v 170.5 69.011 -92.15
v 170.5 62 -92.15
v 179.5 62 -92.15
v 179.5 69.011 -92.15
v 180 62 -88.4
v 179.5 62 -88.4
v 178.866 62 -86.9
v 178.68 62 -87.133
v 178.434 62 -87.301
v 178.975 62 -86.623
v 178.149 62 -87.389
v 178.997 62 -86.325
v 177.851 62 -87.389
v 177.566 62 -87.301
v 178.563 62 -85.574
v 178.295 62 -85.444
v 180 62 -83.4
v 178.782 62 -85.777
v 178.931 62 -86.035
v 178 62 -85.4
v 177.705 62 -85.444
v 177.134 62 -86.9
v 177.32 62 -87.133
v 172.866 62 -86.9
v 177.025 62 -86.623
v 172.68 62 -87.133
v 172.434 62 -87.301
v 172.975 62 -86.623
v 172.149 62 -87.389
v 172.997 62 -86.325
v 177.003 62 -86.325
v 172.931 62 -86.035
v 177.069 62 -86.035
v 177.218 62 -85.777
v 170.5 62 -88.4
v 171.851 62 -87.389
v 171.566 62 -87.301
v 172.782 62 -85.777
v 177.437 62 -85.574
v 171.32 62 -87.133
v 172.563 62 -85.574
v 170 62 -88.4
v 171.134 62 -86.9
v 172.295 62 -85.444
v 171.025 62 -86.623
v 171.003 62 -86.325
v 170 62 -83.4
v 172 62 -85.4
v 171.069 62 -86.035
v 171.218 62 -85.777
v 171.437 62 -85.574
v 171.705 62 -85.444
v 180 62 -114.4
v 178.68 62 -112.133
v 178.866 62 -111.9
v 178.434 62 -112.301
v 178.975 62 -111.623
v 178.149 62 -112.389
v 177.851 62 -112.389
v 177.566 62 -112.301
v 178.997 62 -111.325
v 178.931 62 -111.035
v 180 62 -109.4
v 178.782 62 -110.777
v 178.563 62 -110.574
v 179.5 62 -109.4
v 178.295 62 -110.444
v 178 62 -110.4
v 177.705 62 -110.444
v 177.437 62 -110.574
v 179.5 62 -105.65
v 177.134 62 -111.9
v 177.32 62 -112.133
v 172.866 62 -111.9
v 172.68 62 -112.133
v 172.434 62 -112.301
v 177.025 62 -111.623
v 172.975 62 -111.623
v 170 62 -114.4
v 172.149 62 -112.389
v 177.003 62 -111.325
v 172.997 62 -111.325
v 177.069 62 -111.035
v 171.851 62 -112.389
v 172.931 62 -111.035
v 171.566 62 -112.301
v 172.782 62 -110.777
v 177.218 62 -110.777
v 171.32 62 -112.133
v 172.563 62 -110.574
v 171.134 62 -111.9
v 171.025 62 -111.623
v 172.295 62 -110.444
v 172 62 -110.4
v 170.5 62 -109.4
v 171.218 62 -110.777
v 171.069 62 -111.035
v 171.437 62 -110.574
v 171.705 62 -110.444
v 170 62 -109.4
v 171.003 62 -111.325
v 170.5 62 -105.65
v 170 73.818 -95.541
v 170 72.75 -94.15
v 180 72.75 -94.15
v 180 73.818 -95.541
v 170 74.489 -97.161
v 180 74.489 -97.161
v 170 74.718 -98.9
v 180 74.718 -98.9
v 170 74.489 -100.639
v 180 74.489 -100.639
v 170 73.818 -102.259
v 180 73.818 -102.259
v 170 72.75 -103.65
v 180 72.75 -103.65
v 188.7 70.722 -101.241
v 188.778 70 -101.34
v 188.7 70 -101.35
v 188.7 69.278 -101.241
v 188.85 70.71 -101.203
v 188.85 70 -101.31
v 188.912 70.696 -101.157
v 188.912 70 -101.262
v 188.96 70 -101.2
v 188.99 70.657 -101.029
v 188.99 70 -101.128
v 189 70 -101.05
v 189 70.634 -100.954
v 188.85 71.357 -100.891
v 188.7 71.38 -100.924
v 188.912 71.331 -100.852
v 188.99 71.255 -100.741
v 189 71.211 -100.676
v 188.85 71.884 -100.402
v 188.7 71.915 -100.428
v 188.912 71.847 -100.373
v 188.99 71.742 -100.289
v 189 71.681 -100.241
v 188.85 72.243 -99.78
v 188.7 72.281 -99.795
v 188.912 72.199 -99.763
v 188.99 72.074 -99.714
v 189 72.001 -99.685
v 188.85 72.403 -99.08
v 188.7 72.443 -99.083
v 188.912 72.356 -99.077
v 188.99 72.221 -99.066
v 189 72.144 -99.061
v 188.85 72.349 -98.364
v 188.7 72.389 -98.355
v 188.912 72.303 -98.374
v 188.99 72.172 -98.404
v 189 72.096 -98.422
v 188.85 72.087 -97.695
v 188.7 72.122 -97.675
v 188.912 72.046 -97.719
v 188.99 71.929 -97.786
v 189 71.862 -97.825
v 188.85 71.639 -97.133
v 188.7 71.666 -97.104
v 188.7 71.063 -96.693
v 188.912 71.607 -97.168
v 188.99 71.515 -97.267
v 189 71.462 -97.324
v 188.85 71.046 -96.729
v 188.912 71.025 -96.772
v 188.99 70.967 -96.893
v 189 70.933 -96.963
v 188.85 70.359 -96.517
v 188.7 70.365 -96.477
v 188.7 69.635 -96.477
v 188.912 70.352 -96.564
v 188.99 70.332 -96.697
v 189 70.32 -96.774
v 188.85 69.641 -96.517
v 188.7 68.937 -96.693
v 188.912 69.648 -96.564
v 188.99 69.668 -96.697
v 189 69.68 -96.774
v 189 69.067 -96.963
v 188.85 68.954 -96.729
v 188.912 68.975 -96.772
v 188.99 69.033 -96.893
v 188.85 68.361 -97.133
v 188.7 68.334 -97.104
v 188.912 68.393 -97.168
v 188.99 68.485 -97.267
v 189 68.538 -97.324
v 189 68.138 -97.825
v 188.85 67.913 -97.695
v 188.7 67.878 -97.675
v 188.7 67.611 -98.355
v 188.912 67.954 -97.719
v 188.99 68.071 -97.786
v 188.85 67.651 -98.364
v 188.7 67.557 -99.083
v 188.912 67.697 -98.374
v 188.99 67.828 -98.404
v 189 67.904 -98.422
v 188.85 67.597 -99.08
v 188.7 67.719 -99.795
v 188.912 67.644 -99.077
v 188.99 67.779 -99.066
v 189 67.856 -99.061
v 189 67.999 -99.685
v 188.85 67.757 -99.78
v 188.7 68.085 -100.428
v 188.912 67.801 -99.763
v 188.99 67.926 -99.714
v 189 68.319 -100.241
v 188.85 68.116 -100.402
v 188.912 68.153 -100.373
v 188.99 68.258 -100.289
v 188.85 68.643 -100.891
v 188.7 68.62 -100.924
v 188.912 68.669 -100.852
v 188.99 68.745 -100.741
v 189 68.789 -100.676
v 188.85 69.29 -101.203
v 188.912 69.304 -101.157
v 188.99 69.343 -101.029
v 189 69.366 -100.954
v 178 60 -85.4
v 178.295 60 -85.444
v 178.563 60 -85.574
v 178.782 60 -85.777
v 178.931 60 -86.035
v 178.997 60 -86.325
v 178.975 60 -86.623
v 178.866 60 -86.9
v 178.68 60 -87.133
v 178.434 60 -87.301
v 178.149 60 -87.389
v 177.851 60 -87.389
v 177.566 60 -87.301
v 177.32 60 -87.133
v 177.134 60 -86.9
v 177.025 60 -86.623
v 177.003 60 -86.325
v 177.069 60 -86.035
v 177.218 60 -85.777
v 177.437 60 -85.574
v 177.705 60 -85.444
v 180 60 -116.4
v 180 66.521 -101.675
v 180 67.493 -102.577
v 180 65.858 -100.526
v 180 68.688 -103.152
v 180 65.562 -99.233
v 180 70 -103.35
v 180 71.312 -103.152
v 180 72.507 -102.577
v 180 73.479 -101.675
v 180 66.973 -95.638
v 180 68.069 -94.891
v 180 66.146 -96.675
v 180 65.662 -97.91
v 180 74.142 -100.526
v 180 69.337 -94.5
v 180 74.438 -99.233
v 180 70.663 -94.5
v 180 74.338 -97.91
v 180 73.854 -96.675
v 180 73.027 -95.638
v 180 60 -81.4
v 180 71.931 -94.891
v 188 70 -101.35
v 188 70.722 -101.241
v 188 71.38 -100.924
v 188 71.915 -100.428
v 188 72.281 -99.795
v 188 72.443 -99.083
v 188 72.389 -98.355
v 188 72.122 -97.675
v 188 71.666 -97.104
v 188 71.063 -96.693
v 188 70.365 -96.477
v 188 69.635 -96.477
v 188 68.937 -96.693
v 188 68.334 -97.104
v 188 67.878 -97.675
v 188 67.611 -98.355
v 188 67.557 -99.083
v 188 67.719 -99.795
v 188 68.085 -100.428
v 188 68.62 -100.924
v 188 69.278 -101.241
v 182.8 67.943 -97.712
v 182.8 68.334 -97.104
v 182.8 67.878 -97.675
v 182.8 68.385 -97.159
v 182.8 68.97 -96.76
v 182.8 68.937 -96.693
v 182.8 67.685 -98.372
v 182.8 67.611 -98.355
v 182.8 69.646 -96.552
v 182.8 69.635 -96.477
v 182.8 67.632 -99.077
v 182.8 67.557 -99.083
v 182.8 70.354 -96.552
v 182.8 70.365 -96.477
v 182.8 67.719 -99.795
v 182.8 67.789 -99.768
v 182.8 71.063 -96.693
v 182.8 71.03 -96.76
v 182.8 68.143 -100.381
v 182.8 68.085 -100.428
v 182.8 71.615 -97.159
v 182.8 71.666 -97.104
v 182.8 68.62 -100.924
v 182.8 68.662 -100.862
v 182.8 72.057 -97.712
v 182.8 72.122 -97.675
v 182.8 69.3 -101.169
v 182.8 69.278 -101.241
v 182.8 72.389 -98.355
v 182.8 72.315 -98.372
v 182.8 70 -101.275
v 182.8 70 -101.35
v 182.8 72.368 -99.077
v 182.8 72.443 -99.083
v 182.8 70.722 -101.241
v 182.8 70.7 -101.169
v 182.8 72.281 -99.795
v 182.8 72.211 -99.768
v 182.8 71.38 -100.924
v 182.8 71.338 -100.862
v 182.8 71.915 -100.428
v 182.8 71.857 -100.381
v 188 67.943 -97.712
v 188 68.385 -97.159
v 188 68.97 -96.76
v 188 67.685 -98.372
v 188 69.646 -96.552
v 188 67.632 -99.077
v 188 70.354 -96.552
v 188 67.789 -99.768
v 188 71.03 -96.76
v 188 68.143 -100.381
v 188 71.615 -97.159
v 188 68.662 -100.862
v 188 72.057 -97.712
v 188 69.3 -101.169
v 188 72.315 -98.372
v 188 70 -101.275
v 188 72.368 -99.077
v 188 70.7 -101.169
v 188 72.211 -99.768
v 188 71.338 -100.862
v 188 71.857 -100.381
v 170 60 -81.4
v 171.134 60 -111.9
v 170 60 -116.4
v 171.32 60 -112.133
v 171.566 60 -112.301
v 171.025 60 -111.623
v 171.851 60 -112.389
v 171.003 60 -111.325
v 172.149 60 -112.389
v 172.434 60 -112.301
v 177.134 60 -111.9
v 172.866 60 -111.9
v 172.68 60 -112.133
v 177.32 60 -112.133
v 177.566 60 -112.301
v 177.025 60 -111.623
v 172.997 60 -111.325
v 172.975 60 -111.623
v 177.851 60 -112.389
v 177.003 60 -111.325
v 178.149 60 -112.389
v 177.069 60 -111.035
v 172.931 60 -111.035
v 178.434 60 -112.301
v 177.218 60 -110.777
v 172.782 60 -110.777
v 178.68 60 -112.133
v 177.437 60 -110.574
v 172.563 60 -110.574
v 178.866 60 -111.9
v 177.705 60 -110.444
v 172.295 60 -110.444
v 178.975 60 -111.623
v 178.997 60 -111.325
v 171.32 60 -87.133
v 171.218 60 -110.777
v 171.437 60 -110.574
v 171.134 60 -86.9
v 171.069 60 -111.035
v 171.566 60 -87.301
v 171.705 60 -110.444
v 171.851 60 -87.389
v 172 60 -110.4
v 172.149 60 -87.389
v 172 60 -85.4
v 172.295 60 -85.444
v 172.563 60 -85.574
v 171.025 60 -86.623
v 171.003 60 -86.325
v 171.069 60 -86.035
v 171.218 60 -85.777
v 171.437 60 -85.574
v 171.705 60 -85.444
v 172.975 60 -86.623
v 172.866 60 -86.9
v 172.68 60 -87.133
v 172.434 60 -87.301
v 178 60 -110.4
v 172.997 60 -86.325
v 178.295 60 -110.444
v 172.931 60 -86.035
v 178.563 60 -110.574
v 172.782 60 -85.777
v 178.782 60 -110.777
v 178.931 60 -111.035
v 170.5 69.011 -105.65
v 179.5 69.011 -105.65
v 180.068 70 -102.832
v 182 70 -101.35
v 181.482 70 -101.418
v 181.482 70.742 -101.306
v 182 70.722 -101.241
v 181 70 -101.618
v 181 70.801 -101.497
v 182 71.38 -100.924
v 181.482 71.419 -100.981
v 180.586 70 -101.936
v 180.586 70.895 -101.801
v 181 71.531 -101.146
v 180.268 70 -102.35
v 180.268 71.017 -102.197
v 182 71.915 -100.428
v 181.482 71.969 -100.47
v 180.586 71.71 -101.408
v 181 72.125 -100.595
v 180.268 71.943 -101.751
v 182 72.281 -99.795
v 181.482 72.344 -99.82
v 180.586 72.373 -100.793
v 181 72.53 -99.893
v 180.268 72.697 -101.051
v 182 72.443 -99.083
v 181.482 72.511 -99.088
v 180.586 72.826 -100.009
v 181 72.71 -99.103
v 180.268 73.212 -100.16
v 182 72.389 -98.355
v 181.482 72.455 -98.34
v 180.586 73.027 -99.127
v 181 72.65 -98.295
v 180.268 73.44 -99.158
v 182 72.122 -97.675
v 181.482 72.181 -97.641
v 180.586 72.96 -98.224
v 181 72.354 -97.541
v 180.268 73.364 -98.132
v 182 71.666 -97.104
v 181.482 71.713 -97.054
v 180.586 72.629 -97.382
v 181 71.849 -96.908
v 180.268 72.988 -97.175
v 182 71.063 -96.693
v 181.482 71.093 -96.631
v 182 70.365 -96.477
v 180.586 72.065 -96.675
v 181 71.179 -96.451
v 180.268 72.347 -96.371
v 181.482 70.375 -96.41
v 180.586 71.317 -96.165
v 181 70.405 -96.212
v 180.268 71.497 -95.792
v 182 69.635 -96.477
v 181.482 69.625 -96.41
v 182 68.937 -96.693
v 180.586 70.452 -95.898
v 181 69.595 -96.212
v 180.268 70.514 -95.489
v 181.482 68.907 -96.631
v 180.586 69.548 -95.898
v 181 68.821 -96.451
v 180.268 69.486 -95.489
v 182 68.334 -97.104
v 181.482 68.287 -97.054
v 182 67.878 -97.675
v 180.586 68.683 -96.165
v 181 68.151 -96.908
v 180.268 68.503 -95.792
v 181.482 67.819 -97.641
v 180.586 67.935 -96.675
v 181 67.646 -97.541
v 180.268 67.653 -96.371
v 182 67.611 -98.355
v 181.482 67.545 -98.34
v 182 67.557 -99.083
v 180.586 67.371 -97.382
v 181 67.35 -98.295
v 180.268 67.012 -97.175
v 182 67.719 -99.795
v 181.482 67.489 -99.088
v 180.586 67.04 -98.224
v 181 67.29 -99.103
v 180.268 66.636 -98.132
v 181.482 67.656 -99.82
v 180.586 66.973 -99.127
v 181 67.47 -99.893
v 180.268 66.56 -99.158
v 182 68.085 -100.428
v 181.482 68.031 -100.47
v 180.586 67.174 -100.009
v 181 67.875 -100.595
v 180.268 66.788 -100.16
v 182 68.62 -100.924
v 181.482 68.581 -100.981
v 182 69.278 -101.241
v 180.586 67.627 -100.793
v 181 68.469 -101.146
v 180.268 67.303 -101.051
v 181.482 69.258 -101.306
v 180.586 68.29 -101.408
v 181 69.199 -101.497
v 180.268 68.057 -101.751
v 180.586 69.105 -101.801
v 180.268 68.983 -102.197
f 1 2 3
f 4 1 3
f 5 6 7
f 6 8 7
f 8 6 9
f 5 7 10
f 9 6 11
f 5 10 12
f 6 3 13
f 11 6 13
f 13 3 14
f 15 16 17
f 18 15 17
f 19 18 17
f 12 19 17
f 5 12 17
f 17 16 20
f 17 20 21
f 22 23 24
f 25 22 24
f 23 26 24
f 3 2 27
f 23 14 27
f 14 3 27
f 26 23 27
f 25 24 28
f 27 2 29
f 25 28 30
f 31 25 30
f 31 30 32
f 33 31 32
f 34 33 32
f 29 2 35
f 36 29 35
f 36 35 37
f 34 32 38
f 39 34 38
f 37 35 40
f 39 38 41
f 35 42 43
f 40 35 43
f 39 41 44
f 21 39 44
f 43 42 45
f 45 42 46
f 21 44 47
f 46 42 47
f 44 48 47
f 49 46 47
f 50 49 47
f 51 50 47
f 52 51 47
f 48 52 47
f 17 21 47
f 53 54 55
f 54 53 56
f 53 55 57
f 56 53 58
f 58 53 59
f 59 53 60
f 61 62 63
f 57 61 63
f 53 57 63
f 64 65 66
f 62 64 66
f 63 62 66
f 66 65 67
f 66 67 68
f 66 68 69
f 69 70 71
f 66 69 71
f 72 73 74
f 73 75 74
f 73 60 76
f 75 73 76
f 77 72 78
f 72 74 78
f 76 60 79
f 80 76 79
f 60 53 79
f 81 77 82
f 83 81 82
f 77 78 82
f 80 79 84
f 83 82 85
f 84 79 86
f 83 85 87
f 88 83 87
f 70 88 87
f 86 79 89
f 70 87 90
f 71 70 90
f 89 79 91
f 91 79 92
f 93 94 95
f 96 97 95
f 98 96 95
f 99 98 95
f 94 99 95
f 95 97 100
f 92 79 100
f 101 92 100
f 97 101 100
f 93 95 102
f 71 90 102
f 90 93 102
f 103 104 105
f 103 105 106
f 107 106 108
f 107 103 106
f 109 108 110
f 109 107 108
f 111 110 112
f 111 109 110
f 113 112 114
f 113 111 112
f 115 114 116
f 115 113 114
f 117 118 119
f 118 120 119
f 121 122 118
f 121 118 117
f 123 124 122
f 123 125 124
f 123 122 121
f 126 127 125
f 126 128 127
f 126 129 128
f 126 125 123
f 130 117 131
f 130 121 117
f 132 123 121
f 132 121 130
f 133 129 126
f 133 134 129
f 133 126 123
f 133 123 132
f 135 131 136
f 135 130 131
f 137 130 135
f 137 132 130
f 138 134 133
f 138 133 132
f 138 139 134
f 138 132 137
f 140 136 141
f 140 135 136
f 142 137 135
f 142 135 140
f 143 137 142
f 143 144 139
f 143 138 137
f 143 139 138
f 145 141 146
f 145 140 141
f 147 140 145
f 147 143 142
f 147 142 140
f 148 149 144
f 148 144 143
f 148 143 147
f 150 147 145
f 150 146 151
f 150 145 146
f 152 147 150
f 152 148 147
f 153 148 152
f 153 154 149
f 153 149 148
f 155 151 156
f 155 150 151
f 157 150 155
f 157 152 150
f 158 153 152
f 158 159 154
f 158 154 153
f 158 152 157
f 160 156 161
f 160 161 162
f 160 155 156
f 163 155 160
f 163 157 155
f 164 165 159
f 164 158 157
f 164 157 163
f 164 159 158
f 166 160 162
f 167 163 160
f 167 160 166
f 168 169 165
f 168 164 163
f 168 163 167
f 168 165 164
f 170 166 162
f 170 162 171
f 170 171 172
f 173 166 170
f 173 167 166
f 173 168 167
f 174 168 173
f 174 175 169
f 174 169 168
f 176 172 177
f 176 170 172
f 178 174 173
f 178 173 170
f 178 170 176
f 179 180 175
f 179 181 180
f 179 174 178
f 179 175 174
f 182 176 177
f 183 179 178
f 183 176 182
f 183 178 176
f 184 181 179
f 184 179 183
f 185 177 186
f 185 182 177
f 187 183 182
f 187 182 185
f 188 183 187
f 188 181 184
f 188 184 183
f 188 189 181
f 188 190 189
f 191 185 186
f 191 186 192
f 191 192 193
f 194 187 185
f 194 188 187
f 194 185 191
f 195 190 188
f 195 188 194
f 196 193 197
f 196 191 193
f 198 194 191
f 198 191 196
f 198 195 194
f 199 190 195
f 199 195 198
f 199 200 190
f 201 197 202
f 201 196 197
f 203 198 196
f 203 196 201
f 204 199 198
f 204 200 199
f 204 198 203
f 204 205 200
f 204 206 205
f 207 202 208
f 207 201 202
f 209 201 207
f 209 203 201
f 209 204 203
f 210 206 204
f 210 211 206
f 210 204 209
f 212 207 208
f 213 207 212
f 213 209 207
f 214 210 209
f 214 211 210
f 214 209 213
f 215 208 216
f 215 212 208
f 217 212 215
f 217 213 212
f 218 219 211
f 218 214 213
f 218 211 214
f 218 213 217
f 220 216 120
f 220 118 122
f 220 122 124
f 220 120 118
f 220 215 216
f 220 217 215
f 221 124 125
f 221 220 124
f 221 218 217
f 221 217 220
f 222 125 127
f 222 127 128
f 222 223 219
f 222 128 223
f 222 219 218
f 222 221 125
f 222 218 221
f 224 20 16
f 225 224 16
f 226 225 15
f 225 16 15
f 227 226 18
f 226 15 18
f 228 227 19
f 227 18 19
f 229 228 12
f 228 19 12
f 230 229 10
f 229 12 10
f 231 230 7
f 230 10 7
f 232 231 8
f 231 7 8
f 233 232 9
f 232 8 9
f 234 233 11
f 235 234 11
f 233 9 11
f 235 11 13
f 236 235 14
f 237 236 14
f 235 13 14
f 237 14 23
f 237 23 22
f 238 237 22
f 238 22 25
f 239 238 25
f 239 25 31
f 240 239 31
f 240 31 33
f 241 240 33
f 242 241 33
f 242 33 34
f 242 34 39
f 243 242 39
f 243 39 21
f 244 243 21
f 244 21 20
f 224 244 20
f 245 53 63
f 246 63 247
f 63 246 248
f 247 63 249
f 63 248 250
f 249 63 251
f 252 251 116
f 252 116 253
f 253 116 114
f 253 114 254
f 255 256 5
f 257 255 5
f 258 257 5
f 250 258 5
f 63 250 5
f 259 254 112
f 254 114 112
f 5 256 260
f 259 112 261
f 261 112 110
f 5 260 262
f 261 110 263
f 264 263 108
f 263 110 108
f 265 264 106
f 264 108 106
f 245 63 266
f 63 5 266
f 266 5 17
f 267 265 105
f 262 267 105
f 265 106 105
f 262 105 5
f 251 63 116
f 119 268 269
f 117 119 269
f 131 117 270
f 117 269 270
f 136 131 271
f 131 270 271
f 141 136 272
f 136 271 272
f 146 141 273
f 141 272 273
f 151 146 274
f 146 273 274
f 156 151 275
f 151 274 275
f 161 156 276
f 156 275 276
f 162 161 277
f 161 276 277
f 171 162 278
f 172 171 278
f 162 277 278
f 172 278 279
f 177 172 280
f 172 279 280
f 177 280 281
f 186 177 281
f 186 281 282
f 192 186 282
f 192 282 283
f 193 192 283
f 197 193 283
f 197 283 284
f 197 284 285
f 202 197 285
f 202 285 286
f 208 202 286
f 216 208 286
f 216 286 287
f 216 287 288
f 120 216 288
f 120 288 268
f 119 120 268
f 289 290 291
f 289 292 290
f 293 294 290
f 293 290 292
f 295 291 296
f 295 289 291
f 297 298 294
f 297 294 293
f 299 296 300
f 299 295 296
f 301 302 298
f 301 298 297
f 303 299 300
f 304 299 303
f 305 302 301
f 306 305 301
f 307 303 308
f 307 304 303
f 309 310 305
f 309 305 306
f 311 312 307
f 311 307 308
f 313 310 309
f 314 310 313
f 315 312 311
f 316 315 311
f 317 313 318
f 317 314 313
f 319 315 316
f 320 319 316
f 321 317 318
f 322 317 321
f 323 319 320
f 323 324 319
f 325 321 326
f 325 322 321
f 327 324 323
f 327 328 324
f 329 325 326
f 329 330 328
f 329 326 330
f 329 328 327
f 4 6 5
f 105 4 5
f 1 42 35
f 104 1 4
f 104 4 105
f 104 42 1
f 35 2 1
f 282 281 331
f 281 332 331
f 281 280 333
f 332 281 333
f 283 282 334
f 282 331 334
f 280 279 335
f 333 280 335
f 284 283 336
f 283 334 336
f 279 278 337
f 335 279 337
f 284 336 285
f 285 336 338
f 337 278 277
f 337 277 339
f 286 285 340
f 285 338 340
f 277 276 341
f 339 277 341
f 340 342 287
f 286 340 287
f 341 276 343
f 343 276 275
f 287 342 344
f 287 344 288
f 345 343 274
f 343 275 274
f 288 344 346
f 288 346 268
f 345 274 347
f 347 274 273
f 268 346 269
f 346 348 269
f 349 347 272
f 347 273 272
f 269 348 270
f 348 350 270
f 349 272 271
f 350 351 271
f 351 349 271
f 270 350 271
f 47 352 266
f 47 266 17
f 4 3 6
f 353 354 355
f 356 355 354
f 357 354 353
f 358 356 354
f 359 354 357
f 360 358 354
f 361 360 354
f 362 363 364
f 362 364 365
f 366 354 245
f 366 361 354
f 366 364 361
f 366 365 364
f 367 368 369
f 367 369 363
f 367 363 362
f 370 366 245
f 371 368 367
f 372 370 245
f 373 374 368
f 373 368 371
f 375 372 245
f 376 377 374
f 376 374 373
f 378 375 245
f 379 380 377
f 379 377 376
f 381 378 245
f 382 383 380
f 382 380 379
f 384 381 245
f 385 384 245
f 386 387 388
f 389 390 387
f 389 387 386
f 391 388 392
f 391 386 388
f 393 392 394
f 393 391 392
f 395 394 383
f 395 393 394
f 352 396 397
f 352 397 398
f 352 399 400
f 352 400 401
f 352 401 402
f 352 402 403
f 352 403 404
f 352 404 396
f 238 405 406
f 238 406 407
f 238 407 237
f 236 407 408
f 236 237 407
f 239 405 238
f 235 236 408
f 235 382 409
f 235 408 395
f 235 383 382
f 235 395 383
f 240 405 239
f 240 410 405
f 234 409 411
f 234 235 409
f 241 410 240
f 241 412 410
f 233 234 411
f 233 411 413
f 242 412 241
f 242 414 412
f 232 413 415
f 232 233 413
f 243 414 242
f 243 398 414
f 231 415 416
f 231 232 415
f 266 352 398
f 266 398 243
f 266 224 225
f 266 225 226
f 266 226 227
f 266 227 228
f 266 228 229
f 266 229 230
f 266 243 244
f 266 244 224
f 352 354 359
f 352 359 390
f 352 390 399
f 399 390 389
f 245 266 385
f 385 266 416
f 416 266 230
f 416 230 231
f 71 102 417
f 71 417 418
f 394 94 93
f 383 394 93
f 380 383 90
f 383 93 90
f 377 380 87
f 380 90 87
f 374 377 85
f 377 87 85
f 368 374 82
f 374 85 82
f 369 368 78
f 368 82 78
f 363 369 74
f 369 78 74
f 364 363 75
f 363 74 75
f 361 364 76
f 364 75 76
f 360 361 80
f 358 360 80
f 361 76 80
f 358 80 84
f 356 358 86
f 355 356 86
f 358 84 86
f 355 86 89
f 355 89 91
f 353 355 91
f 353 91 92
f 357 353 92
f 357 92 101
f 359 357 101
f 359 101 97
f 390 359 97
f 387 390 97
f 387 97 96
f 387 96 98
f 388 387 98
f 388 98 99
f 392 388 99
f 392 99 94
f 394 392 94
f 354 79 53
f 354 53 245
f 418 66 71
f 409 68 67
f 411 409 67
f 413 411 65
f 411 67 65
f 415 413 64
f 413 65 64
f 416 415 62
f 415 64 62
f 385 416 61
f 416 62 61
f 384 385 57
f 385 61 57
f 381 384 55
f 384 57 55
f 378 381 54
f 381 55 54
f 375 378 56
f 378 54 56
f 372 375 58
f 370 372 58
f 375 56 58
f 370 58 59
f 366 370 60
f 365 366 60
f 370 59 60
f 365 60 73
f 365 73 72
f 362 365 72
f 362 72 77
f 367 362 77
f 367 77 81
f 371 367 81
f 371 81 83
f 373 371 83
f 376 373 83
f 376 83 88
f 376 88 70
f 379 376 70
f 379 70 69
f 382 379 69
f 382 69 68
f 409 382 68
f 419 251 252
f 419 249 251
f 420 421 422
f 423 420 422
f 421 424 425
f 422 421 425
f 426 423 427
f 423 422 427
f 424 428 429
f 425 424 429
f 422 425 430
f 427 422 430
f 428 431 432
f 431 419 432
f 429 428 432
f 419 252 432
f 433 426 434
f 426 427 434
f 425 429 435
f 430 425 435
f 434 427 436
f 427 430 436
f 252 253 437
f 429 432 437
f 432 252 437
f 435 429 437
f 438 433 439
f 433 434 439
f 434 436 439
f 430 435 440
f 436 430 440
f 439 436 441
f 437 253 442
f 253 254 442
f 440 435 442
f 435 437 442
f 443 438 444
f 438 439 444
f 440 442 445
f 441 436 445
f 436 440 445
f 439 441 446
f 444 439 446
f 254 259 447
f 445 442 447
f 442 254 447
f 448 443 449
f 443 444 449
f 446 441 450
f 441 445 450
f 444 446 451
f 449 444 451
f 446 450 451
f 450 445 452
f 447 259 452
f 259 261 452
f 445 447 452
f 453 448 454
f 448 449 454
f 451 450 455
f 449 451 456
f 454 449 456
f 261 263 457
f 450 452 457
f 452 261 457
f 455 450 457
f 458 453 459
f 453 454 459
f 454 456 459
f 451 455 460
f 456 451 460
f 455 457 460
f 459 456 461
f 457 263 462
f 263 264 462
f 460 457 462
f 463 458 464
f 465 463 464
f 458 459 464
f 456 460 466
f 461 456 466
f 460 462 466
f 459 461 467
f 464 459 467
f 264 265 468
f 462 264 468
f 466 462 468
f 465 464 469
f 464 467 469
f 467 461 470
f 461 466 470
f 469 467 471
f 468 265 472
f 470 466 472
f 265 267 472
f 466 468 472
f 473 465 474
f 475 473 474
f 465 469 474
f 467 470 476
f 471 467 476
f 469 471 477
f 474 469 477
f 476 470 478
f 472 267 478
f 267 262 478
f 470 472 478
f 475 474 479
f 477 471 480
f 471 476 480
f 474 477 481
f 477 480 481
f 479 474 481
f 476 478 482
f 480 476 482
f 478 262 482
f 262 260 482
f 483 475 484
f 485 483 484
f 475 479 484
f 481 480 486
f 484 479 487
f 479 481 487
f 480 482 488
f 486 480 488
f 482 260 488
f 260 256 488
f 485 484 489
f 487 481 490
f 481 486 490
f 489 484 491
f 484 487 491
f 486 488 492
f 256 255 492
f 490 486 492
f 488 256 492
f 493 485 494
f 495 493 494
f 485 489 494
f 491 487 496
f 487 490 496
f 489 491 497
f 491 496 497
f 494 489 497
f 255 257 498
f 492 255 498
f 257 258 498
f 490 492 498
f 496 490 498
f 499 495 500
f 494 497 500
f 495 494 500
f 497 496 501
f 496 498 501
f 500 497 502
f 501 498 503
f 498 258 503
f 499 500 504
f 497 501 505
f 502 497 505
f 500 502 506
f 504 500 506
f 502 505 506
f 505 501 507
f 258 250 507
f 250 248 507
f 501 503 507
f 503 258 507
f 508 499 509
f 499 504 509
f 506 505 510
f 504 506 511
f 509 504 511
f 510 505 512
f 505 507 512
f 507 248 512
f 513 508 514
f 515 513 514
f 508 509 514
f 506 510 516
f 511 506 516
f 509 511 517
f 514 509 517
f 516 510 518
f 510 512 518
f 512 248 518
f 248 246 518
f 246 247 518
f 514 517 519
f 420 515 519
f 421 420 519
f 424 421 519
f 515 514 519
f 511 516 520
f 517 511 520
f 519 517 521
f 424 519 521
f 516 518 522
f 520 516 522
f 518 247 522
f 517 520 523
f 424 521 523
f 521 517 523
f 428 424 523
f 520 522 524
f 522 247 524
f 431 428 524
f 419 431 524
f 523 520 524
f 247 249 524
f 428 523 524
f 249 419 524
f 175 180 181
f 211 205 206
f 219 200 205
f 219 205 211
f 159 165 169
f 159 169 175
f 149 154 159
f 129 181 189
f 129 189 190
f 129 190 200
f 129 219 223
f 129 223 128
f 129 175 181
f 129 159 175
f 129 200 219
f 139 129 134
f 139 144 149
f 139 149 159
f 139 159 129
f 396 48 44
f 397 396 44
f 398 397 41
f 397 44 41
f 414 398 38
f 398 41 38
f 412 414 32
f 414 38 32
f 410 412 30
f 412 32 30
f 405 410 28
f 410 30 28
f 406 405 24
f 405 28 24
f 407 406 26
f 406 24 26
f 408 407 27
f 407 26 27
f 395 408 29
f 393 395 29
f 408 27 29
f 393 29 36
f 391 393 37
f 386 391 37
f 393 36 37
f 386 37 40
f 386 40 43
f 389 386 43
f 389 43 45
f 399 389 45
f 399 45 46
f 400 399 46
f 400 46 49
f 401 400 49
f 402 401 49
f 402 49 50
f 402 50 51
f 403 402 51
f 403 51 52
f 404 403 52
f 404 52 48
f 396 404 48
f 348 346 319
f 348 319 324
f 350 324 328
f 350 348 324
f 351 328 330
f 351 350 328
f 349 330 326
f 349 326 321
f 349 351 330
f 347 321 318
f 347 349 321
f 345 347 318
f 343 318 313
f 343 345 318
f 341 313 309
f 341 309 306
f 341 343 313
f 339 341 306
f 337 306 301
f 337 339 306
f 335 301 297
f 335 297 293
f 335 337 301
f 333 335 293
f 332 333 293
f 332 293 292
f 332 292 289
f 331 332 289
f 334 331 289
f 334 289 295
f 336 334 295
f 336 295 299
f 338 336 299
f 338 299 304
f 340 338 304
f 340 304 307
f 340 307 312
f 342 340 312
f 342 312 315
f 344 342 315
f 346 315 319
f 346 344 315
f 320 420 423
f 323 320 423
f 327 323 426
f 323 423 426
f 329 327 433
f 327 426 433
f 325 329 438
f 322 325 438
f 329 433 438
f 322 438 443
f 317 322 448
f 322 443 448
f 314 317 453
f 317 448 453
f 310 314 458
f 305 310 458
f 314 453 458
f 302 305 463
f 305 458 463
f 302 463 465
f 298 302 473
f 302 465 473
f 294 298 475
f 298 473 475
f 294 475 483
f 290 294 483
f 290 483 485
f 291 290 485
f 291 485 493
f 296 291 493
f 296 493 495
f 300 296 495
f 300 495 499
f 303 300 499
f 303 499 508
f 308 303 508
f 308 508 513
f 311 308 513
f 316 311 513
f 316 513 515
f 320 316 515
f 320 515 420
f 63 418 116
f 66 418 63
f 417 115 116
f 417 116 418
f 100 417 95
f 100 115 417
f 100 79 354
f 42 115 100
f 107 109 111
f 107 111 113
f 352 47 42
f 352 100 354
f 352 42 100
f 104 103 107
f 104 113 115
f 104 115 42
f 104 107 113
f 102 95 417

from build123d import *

# Parameters (mm, degrees)
SKETCH2_W                 = 200
SKETCH2_H                 = 200
BOSS_EXTRUDE2_DEPTH       = 60
BOSS_EXTRUDE3_START       = -38
BOSS_EXTRUDE3_DEPTH       = 41
SKETCH5_W                 = 180
SKETCH5_H                 = 180
CUT_EXTRUDE2_DEPTH        = 50
BOSS_EXTRUDE4_START       = -81.2
BOSS_EXTRUDE4_DEPTH       = 30
CUT_EXTRUDE3_DEPTH        = 35
CUT_EXTRUDE4_DEPTH        = 10
CUT_EXTRUDE6_START        = -26
CUT_EXTRUDE6_DEPTH        = 26
SKETCH11_W                = 120
SKETCH11_H                = 10
CUT_EXTRUDE7_DEPTH        = 26
SKETCH12_W                = 180
SKETCH12_H                = 50
CUT_EXTRUDE8_DEPTH        = 200
SKETCH13_W                = 180
SKETCH13_H                = 50
CUT_EXTRUDE9_DEPTH        = 200
SKETCH15_W                = 19.8
SKETCH15_H                = 40.6
CUT_EXTRUDE11_DEPTH       = 10
BOSS_EXTRUDE5_DEPTH       = 26
SKETCH20_W                = 19.8
SKETCH20_H                = 7
CUT_EXTRUDE14_DEPTH       = 8.2
SKETCH22_W                = 22
SKETCH22_H                = 68.38628635
SKETCH22_W_2              = 33
SKETCH22_H_2              = 70.357034464
CUT_EXTRUDE16_DEPTH       = 6
CUT_EXTRUDE17_DEPTH       = 150
SKETCH24_W                = 190
SKETCH24_H                = 55
CUT_EXTRUDE18_DEPTH       = 200
SKETCH41_W                = 200
SKETCH41_H                = 200
SKETCH41_W_2              = 115.381197846
SKETCH41_H_2              = 110.8
CUT_EXTRUDE25_DEPTH       = 100
CUT_EXTRUDE26_DEPTH       = 26
SKETCH43_R                = 85
BOSS_EXTRUDE9_DEPTH       = 5
CUT_EXTRUDE27_DEPTH       = 11
BOSS_EXTRUDE10_DEPTH      = 4
BOSS_EXTRUDE11_DEPTH      = 24
BOSS_EXTRUDE12_DEPTH      = 26
BOSS_EXTRUDE14_DEPTH      = 4
CUT_EXTRUDE29_DEPTH       = 18
CUT_EXTRUDE30_DEPTH       = 2
CUT_EXTRUDE31_DEPTH       = 2
SKETCH55_W                = 19.8
SKETCH55_H                = 2.410200662
BOSS_EXTRUDE16_DEPTH      = 4
SKETCH56_W                = 22
SKETCH56_H                = 70.356823689
CUT_EXTRUDE32_DEPTH       = 4
BOSS_EXTRUDE17_DEPTH      = 26
BOSS_EXTRUDE18_DEPTH      = 26
BOSS_EXTRUDE19_START      = 170
BOSS_EXTRUDE19_DEPTH      = 10
SKETCH60_R                = 2.45
BOSS_EXTRUDE20_DEPTH      = 9
FILLET1_R                 = 0.3
CUT_EXTRUDE33_START       = -1
SKETCH61_R                = 2.45
SKETCH61_R_2              = 2.375
CUT_EXTRUDE33_DEPTH       = 5.2
FILLET2_R                 = 2
BOSS_EXTRUDE21_START      = 140
BOSS_EXTRUDE21_DEPTH      = 10
SKETCH63_R                = 2.45
BOSS_EXTRUDE22_DEPTH      = 9
FILLET3_R                 = 0.3
FILLET4_R                 = 2
CUT_EXTRUDE34_START       = -1
SKETCH64_R                = 2.45
SKETCH64_R_2              = 2.375
CUT_EXTRUDE34_DEPTH       = 5.2
SKETCH67_R                = 95.168377016
SKETCH67_R_2              = 84.75
CUT_EXTRUDE36_DEPTH       = 5
CUT_EXTRUDE37_DEPTH       = 300
CUT_EXTRUDE37_DEPTH_BACK  = 300
F_2_0MM_DOWEL_HOLE1_D     = 2
F_2_0MM_DOWEL_HOLE1_DEPTH = 10
F_2_0MM_DOWEL_HOLE1_TIP   = 0.600860619
CUT_EXTRUDE39_START       = -2
SKETCH74_W                = 9
SKETCH74_H                = 11.89890002
SKETCH74_H_2              = 12.887833041
CUT_EXTRUDE39_DEPTH       = 300
SKETCH75_W                = 5
SKETCH75_H                = 5
CUT_EXTRUDE40_DEPTH       = 300
CUT_EXTRUDE41_DEPTH       = 300


with BuildPart() as part:
    # Sketch2 → Boss-Extrude2 (new body)
    with BuildSketch(Plane(origin=(0, 0, 0), x_dir=(1, 0, 0), z_dir=(0, 1, 0))):
        with Locations((100, 100)):
            Rectangle(SKETCH2_W, SKETCH2_H)
    extrude(amount=BOSS_EXTRUDE2_DEPTH)

    # Sketch3 → Boss-Extrude3 (add)
    with BuildSketch(Plane.XY.offset(BOSS_EXTRUDE3_START)):
        with BuildLine():
            Line((40, 60), (80.980762114, 130.980762114))
            ThreePointArc((80.980762114, 130.980762114), (100, 141.961524227), (119.019237886, 130.980762114))
            Line((119.019237886, 130.980762114), (160, 60))
            Line((160, 60), (40, 60))
        make_face()
    extrude(amount=-BOSS_EXTRUDE3_DEPTH)

    # Sketch5 → Cut-Extrude2 (cut)
    with BuildSketch(Plane.XZ):
        with Locations((100, -100)):
            Rectangle(SKETCH5_W, SKETCH5_H)
    extrude(amount=-CUT_EXTRUDE2_DEPTH, mode=Mode.SUBTRACT)

    # Sketch7 → Boss-Extrude4 (add)
    with BuildSketch(Plane(origin=(0, 0, -200), x_dir=(-1, 0, 0), z_dir=(0, 0, -1)).offset(BOSS_EXTRUDE4_START)):
        with BuildLine():
            Line((-160, 60), (-40, 60))
            Line((-40, 60), (-80.980762114, 130.980762114))
            ThreePointArc((-80.980762114, 130.980762114), (-100, 141.961524227), (-119.019237886, 130.980762114))
            Line((-119.019237886, 130.980762114), (-160, 60))
        make_face()
    extrude(amount=BOSS_EXTRUDE4_DEPTH)

    # Sketch8 → Cut-Extrude3 (cut)
    with BuildSketch(Plane.XY.offset(-38)):
        with BuildLine():
            Line((48.660254038, 65), (151.339745962, 65))
            Line((151.339745962, 65), (114.689110868, 128.480762114))
            ThreePointArc((114.689110868, 128.480762114), (100, 136.961524227), (85.310889132, 128.480762114))
            Line((85.310889132, 128.480762114), (48.660254038, 65))
        make_face()
    extrude(amount=-CUT_EXTRUDE3_DEPTH, mode=Mode.SUBTRACT)

    # Sketch9 → Cut-Extrude4 (cut)
    with BuildSketch(Plane.XY.offset(-118.8)):
        with BuildLine():
            Line((95, 141.384773704), (95, 105))
            ThreePointArc((95, 105), (100, 100), (105, 105))
            Line((105, 105), (105, 141.384773704))
            ThreePointArc((105, 141.384773704), (100, 141.961524227), (95, 141.384773704))
        make_face()
    extrude(amount=-CUT_EXTRUDE4_DEPTH, mode=Mode.SUBTRACT)

    # Sketch10 → Cut-Extrude6 (cut)
    with BuildSketch(Plane(origin=(0, 0, -148.8), x_dir=(-1, 0, 0), z_dir=(0, 0, -1)).offset(CUT_EXTRUDE6_START)):
        with BuildLine():
            Line((-114.689110868, 128.480762114), (-151.339745962, 65))
            Line((-151.339745962, 65), (-48.660254038, 65))
            Line((-48.660254038, 65), (-85.310889132, 128.480762114))
            ThreePointArc((-85.310889132, 128.480762114), (-87.382612213, 131.335555987), (-90, 133.700120587))
            Line((-90, 133.700120587), (-90, 105))
            ThreePointArc((-90, 105), (-100, 95), (-110, 105))
            Line((-110, 105), (-110, 133.700120587))
            ThreePointArc((-110, 133.700120587), (-112.617387787, 131.335555987), (-114.689110868, 128.480762114))
        make_face()
    extrude(amount=CUT_EXTRUDE6_DEPTH, mode=Mode.SUBTRACT)

    # Sketch11 → Cut-Extrude7 (cut)
    with BuildSketch(Plane(origin=(0, 60, 0), x_dir=(1, 0, 0), z_dir=(0, 1, 0))):
        with Locations((100, 113.8)):
            Rectangle(SKETCH11_W, SKETCH11_H)
    extrude(amount=-CUT_EXTRUDE7_DEPTH, mode=Mode.SUBTRACT)

    # Sketch12 → Cut-Extrude8 (cut)
    with BuildSketch(Plane(origin=(200, 0, 0), x_dir=(0, 0, -1), z_dir=(1, 0, 0))):
        with Locations((100, 25)):
            Rectangle(SKETCH12_W, SKETCH12_H)
    extrude(amount=-CUT_EXTRUDE8_DEPTH, mode=Mode.SUBTRACT)

    # Sketch13 → Cut-Extrude9 (cut)
    with BuildSketch(Plane.XY):
        with Locations((100, 25)):
            Rectangle(SKETCH13_W, SKETCH13_H)
    extrude(amount=-CUT_EXTRUDE9_DEPTH, mode=Mode.SUBTRACT)

    # Sketch15 → Cut-Extrude11 (cut)
    with BuildSketch(Plane.XY.offset(-73)):
        with Locations((100, 94.7)):
            Rectangle(SKETCH15_W, SKETCH15_H)
    extrude(amount=-CUT_EXTRUDE11_DEPTH, mode=Mode.SUBTRACT)

    # Sketch16 → Boss-Extrude5 (add)
    with BuildSketch(Plane.XY.offset(-73)):
        Polygon((88.1, 115), (88.1, 72.4), (111.9, 72.4), (111.9, 115), (109.9, 115), (109.9, 74.4), (90.1, 74.4), (90.1, 115), align=None)
    extrude(amount=BOSS_EXTRUDE5_DEPTH)

    # Sketch20 → Cut-Extrude14 (cut)
    with BuildSketch(Plane(origin=(0, 0, -79), x_dir=(-1, 0, 0), z_dir=(0, 0, -1))):
        with Locations((-100, 118.5)):
            Rectangle(SKETCH20_W, SKETCH20_H)
        with Locations((-100, 70.9)):
            Rectangle(SKETCH20_W, SKETCH20_H)
    extrude(amount=-CUT_EXTRUDE14_DEPTH, mode=Mode.SUBTRACT)

    # Sketch22 → Cut-Extrude16 (cut)
    with BuildSketch(Plane(origin=(4.019237886, -2.320508076, 0), x_dir=(0, 0, 1), z_dir=(-0.8660254037844397, 0.49999999999999806, 0))):
        with Locations((-133.8, 115.729905279)):
            Rectangle(SKETCH22_W, SKETCH22_H)
        with Locations((-58.5, 116.744531222)):
            Rectangle(SKETCH22_W_2, SKETCH22_H_2)
    extrude(amount=-CUT_EXTRUDE16_DEPTH, mode=Mode.SUBTRACT)

    # Sketch23 → Cut-Extrude17 (cut)
    with BuildSketch(Plane.XY.offset(-38)):
        with BuildLine():
            Line((43.464101615, 62), (42.309401077, 60))
            Line((42.309401077, 60), (36.951802896, 60))
            Line((36.951802896, 60), (100, 183.688158135))
            Line((100, 183.688158135), (162.604774917, 60))
            Line((162.604774917, 60), (157.690598923, 60))
            Line((157.690598923, 60), (156.535898385, 62))
            Line((156.535898385, 62), (117.287187079, 129.980762114))
            ThreePointArc((117.287187079, 129.980762114), (100, 139.961524227), (82.712812921, 129.980762114))
            Line((82.712812921, 129.980762114), (43.464101615, 62))
        make_face()
    extrude(amount=-CUT_EXTRUDE17_DEPTH, mode=Mode.SUBTRACT)

    # Sketch24 → Cut-Extrude18 (cut)
    with BuildSketch(Plane(origin=(0, 0, -200), x_dir=(-1, 0, 0), z_dir=(0, 0, -1))):
        with Locations((-100, 27.5)):
            Rectangle(SKETCH24_W, SKETCH24_H)
    extrude(amount=-CUT_EXTRUDE18_DEPTH, mode=Mode.SUBTRACT)

    # Sketch41 → Cut-Extrude25 (cut)
    with BuildSketch(Plane(origin=(0, 60, 0), x_dir=(1, 0, 0), z_dir=(0, 1, 0))):
        with Locations((100, 100)):
            Rectangle(SKETCH41_W, SKETCH41_H)
        with Locations((100, 93.4)):
            Rectangle(SKETCH41_W_2, SKETCH41_H_2, mode=Mode.SUBTRACT)
    extrude(amount=-CUT_EXTRUDE25_DEPTH, mode=Mode.SUBTRACT)


with BuildPart() as cut_extrude25_piece_1:
    # of the separate pieces the step leaves, piece 1, a body of its own (cut_extrude25_pieces)
    add(part.part.solids().sort_by_distance((42.309401077, 55, -108.8))[0])



with BuildPart() as cut_extrude25_piece_2:
    # of the separate pieces the step leaves, piece 2, a body of its own (cut_extrude25_pieces)
    add(part.part.solids().sort_by_distance((42.309401077, 55, -118.8))[0])

    # Sketch38 → Cut-Extrude26 (cut)
    with BuildSketch(Plane(origin=(0, 0, -148.8), x_dir=(-1, 0, 0), z_dir=(0, 0, -1))):
        with BuildLine():
            Line((-110, 133.700120587), (-107, 135.763853262))
            Line((-107, 135.763853262), (-107, 105))
            ThreePointArc((-107, 105), (-100, 98), (-93, 105))
            Line((-93, 105), (-93, 135.763853262))
            Line((-93, 135.763853262), (-90, 133.700120587))
            Line((-90, 133.700120587), (-90, 105))
            ThreePointArc((-90, 105), (-100, 95), (-110, 105))
            Line((-110, 105), (-110, 133.700120587))
        make_face()
    extrude(amount=-CUT_EXTRUDE26_DEPTH, mode=Mode.SUBTRACT)


with BuildPart() as cut_extrude25_piece_1_1:
    add(cut_extrude25_piece_1.part)

    add(cut_extrude25_piece_2.part)  # Boss-Extrude9 merges Cut-Extrude25 piece 2
    # Sketch43 → Boss-Extrude9 (add)
    with BuildSketch(Plane.XZ.offset(-55)):
        with Locations((100, -98.8)):
            Circle(SKETCH43_R)
    extrude(amount=-BOSS_EXTRUDE9_DEPTH)

    # Sketch45 → Cut-Extrude27 (cut)
    with BuildSketch(Plane.XY.offset(-38)):
        with BuildLine():
            Line((42.309401077, 60), (82.712812921, 129.980762114))
            ThreePointArc((82.712812921, 129.980762114), (100, 139.961524227), (117.287187079, 129.980762114))
            Line((117.287187079, 129.980762114), (157.690598923, 60))
            Line((157.690598923, 60), (42.309401077, 60))
        make_face()
        with BuildLine():
            Line((151.339745962, 65), (114.689110868, 128.480762114))
            ThreePointArc((114.689110868, 128.480762114), (100, 136.961524227), (85.310889132, 128.480762114))
            Line((85.310889132, 128.480762114), (48.660254038, 65))
            Line((48.660254038, 65), (151.339745962, 65))
        make_face(mode=Mode.SUBTRACT)
    extrude(amount=-CUT_EXTRUDE27_DEPTH, mode=Mode.SUBTRACT)

    # Sketch46 → Boss-Extrude10 (add)
    with BuildSketch(Plane.XY.offset(-49)):
        Polygon((81.712812921, 128.248711306), (46.534295689, 67.317732125), (49.094273419, 65.839728294), (84.272790651, 126.770707475), align=None)
    extrude(amount=-BOSS_EXTRUDE10_DEPTH)

    # Sketch47 → Boss-Extrude11 (add)
    with BuildSketch(Plane.XY.offset(-73)):
        Polygon((49.1323719, 65.817732125), (50.548725488, 65), (48.660254038, 65), align=None)
    extrude(amount=BOSS_EXTRUDE11_DEPTH)

    # Sketch48 → Boss-Extrude12 (add)
    with BuildSketch(Plane(origin=(0, 0, -122.8), x_dir=(-1, 0, 0), z_dir=(0, 0, -1))):
        Polygon((-49.117745958, 65.792399249), (-50.490221717, 65), (-48.660254038, 65), align=None)
    extrude(amount=BOSS_EXTRUDE12_DEPTH)

    # Sketch49 → Boss-Extrude14 (add)
    with BuildSketch(Plane.XY.offset(-75)):
        Polygon((49.998397304, 65.317732125), (49.094273419, 65.839728294), (84.272790651, 126.770707475), (85.176914536, 126.248711306), align=None)
    extrude(amount=BOSS_EXTRUDE14_DEPTH)

    # Sketch52 → Cut-Extrude29 (cut)
    with BuildSketch(Plane(origin=(0, 0, -148.8), x_dir=(-1, 0, 0), z_dir=(0, 0, -1))):
        with BuildLine():
            Line((-93, 135.763853262), (-93, 105))
            ThreePointArc((-93, 105), (-100, 98), (-107, 105))
            Line((-107, 105), (-107, 135.763853262))
            ThreePointArc((-107, 135.763853262), (-100, 137.248161341), (-93, 135.763853262))
        make_face()
    extrude(amount=-CUT_EXTRUDE29_DEPTH, mode=Mode.SUBTRACT)

    # Sketch53 → Cut-Extrude30 (cut)
    with BuildSketch(Plane.XY.offset(-71)):
        Polygon((85.176914536, 126.248711306), (84.272790651, 126.770707475), (49.090707581, 65.833552081), (49.994831466, 65.311555913), align=None)
    extrude(amount=-CUT_EXTRUDE30_DEPTH, mode=Mode.SUBTRACT)

    # Sketch54 → Cut-Extrude31 (cut)
    with BuildSketch(Plane.XY.offset(-73)):
        with BuildLine():
            Line((50.548725488, 65), (151.339745962, 65))
            Line((151.339745962, 65), (114.689110868, 128.480762114))
            ThreePointArc((114.689110868, 128.480762114), (100, 136.961524227), (85.310889132, 128.480762114))
            Line((85.310889132, 128.480762114), (84.310889132, 126.748711306))
            Line((84.310889132, 126.748711306), (84.272790651, 126.770707475))
            Line((84.272790651, 126.770707475), (49.094273419, 65.839728294))
            Line((49.094273419, 65.839728294), (49.090707581, 65.833552081))
            Line((49.090707581, 65.833552081), (49.994831466, 65.311555913))
            Line((49.994831466, 65.311555913), (49.998397304, 65.317732125))
            Line((49.998397304, 65.317732125), (50.548725488, 65))
        make_face()
        Polygon((109.9, 67.4), (90.1, 67.4), (90.1, 72.4), (88.1, 72.4), (88.1, 115), (90.1, 115), (90.1, 122), (109.9, 122), (109.9, 115), (111.9, 115), (111.9, 72.4), (109.9, 72.4), align=None, mode=Mode.SUBTRACT)
    extrude(amount=-CUT_EXTRUDE31_DEPTH, mode=Mode.SUBTRACT)

    # Sketch55 → Boss-Extrude16 (add)
    with BuildSketch(Plane.XY.offset(-75)):
        with Locations((100, 66.194899669)):
            Rectangle(SKETCH55_W, SKETCH55_H)
    extrude(amount=BOSS_EXTRUDE16_DEPTH)

    # Sketch56 → Cut-Extrude32 (cut)
    with BuildSketch(Plane(origin=(144.248711306, 83.282032303, 0), x_dir=(0, 0, -1), z_dir=(0.8660254037844362, 0.5000000000000044, 0))):
        with Locations((64, 16.744636609)):
            Rectangle(SKETCH56_W, SKETCH56_H)
        with Locations((133.8, 16.744636609)):
            Rectangle(SKETCH56_W, SKETCH56_H)
    extrude(amount=-CUT_EXTRUDE32_DEPTH, mode=Mode.SUBTRACT)

    # Sketch57 → Boss-Extrude17 (add)
    with BuildSketch(Plane.XY.offset(-75)):
        Polygon((150.867522712, 65.817914662), (149.450852961, 65), (151.339745962, 65), align=None)
    extrude(amount=BOSS_EXTRUDE17_DEPTH)

    # Sketch58 → Boss-Extrude18 (add)
    with BuildSketch(Plane(origin=(0, 0, -122.8), x_dir=(-1, 0, 0), z_dir=(0, 0, -1))):
        Polygon((-150.867522712, 65.817914662), (-151.339745962, 65), (-149.450852961, 65), align=None)
    extrude(amount=BOSS_EXTRUDE18_DEPTH)

    # Sketch59 → Boss-Extrude19 (add)
    with BuildSketch(Plane(origin=(0, 0, 0), x_dir=(0, 0, -1), z_dir=(1, 0, 0)).offset(BOSS_EXTRUDE19_START)):
        with BuildLine():
            Line((81.4, 60), (94.15, 72.75))
            ThreePointArc((94.15, 72.75), (98.9, 74.717514421), (103.65, 72.75))
            Line((103.65, 72.75), (116.4, 60))
            Line((116.4, 60), (81.4, 60))
        make_face()
        with BuildLine():
            Line((81.4, 55), (116.4, 55))
            Line((116.4, 55), (103.65, 42.25))
            ThreePointArc((103.65, 42.25), (98.9, 40.282485579), (94.15, 42.25))
            Line((94.15, 42.25), (81.4, 55))
        make_face()
    extrude(amount=BOSS_EXTRUDE19_DEPTH)

    # Sketch60 → Boss-Extrude20 (add)
    with BuildSketch(Plane(origin=(180, 0, 0), x_dir=(0, 0, -1), z_dir=(1, 0, 0))):
        with Locations((98.9, 70)):
            Circle(SKETCH60_R)
        with Locations((98.9, 45)):
            Circle(SKETCH60_R)
    extrude(amount=BOSS_EXTRUDE20_DEPTH)

    # Fillet1
    fillet1_edges = [cut_extrude25_piece_1_1.edges().sort_by_distance(p)[0] for p in [
        (189, 70, -96.45),
        (189, 45, -96.45),
    ]]
    fillet(fillet1_edges, radius=FILLET1_R)

    # Sketch61 → Cut-Extrude33 (cut)
    # profile 1 of 2: a face of its own
    with BuildSketch(Plane(origin=(189, 0, 0), x_dir=(0, 0, -1), z_dir=(1, 0, 0)).offset(CUT_EXTRUDE33_START)):
        with Locations((98.9, 70)):
            Circle(SKETCH61_R)
        with Locations((98.9, 70)):
            Circle(SKETCH61_R_2, mode=Mode.SUBTRACT)
    # profile 2 of 2: a face of its own
    with BuildSketch(Plane(origin=(189, 0, 0), x_dir=(0, 0, -1), z_dir=(1, 0, 0)).offset(CUT_EXTRUDE33_START)):
        with Locations((98.9, 45)):
            Circle(SKETCH61_R)
        with Locations((98.9, 45)):
            Circle(SKETCH61_R_2, mode=Mode.SUBTRACT)
    extrude(amount=-CUT_EXTRUDE33_DEPTH, mode=Mode.SUBTRACT)

    # Fillet2
    fillet2_edges = [cut_extrude25_piece_1_1.edges().sort_by_distance(p)[0] for p in [
        (180, 70, -96.45),
        (180, 45, -96.45),
    ]]
    fillet(fillet2_edges, radius=FILLET2_R)

    # Sketch62 → Boss-Extrude21 (add)
    with BuildSketch(Plane.ZY.offset(-170).offset(BOSS_EXTRUDE21_START)):
        with BuildLine():
            Line((-81.4, 55), (-94.15, 42.25))
            ThreePointArc((-94.15, 42.25), (-98.9, 40.282485579), (-103.65, 42.25))
            Line((-103.65, 42.25), (-116.4, 55))
            Line((-116.4, 55), (-81.4, 55))
        make_face()
    extrude(amount=BOSS_EXTRUDE21_DEPTH)

    # Sketch63 → Boss-Extrude22 (add)
    with BuildSketch(Plane.ZY.offset(-20)):
        with Locations((-98.9, 45)):
            Circle(SKETCH63_R)
    extrude(amount=BOSS_EXTRUDE22_DEPTH)

    # Fillet3
    fillet3_edges = [cut_extrude25_piece_1_1.edges().sort_by_distance(p)[0] for p in [
        (11, 45, -101.35),
    ]]
    fillet(fillet3_edges, radius=FILLET3_R)

    # Fillet4
    fillet4_edges = [cut_extrude25_piece_1_1.edges().sort_by_distance(p)[0] for p in [
        (20, 45, -101.35),
    ]]
    fillet(fillet4_edges, radius=FILLET4_R)

    # Sketch64 → Cut-Extrude34 (cut)
    with BuildSketch(Plane.ZY.offset(-11).offset(CUT_EXTRUDE34_START)):
        with Locations((-98.9, 45)):
            Circle(SKETCH64_R)
        with Locations((-98.9, 45)):
            Circle(SKETCH64_R_2, mode=Mode.SUBTRACT)
    extrude(amount=-CUT_EXTRUDE34_DEPTH, mode=Mode.SUBTRACT)

    # Sketch67 → Cut-Extrude36 (cut)
    with BuildSketch(Plane(origin=(0, 60, 0), x_dir=(1, 0, 0), z_dir=(0, 1, 0))):
        with Locations((100, 98.8)):
            Circle(SKETCH67_R)
        with Locations((100, 98.8)):
            Circle(SKETCH67_R_2, mode=Mode.SUBTRACT)
    extrude(amount=-CUT_EXTRUDE36_DEPTH, mode=Mode.SUBTRACT)

    # Sketch69 → Cut-Extrude37 (cut, two sides: drawn at the far end of the back side and taken through both)
    with BuildSketch(Plane.XY.offset(-49).offset(-CUT_EXTRUDE37_DEPTH_BACK)):
        Polygon((170, 23.542190337), (-15.62420472, 23.542190337), (-15.62420472, 153.961909404), (170, 153.961909404), (170, 60), (192.608960178, 60), (192.608960178, 23.542190337), align=None)
    extrude(amount=CUT_EXTRUDE37_DEPTH + CUT_EXTRUDE37_DEPTH_BACK, mode=Mode.SUBTRACT)

    # Ø2.0mm Dowel Hole1
    with Locations(Plane(origin=(172, 60, -86.4), x_dir=(0, 0, -1), z_dir=(0, -1, 0))):
        with Locations((0, 0), (0, 6), (25, 0), (25, 6)):
            Hole(F_2_0MM_DOWEL_HOLE1_D / 2, depth=F_2_0MM_DOWEL_HOLE1_DEPTH)
            with Locations((0, 0, -(F_2_0MM_DOWEL_HOLE1_DEPTH + F_2_0MM_DOWEL_HOLE1_TIP / 2))):  # 118° drill point
                Cone(0, F_2_0MM_DOWEL_HOLE1_D / 2, F_2_0MM_DOWEL_HOLE1_TIP, mode=Mode.SUBTRACT)

    # Sketch74 → Cut-Extrude39 (cut)
    with BuildSketch(Plane.XZ.offset(-60).offset(CUT_EXTRUDE39_START)):
        with Locations((175, -111.59945001)):
            Rectangle(SKETCH74_W, SKETCH74_H)
        with Locations((175, -85.706083479)):
            Rectangle(SKETCH74_W, SKETCH74_H_2)
    extrude(amount=-CUT_EXTRUDE39_DEPTH, mode=Mode.SUBTRACT)

    # Sketch75 → Cut-Extrude40 (cut)
    with BuildSketch(Plane.ZY.offset(-170)):
        with Locations((-111.9, 64.5)):
            Rectangle(SKETCH75_W, SKETCH75_H)
        with Locations((-85.9, 64.5)):
            Rectangle(SKETCH75_W, SKETCH75_H)
    extrude(amount=-CUT_EXTRUDE40_DEPTH, mode=Mode.SUBTRACT)

    # Sketch76 → Cut-Extrude41 (cut)
    with BuildSketch(Plane.ZY.offset(-170)):
        Polygon((-103.65, 72.75), (-109.4, 62), (-109.4, 67), align=None)
        Polygon((-88.4, 62), (-94.15, 72.75), (-88.4, 67), align=None)
    extrude(amount=-CUT_EXTRUDE41_DEPTH, mode=Mode.SUBTRACT)


solid = cut_extrude25_piece_1_1.part
